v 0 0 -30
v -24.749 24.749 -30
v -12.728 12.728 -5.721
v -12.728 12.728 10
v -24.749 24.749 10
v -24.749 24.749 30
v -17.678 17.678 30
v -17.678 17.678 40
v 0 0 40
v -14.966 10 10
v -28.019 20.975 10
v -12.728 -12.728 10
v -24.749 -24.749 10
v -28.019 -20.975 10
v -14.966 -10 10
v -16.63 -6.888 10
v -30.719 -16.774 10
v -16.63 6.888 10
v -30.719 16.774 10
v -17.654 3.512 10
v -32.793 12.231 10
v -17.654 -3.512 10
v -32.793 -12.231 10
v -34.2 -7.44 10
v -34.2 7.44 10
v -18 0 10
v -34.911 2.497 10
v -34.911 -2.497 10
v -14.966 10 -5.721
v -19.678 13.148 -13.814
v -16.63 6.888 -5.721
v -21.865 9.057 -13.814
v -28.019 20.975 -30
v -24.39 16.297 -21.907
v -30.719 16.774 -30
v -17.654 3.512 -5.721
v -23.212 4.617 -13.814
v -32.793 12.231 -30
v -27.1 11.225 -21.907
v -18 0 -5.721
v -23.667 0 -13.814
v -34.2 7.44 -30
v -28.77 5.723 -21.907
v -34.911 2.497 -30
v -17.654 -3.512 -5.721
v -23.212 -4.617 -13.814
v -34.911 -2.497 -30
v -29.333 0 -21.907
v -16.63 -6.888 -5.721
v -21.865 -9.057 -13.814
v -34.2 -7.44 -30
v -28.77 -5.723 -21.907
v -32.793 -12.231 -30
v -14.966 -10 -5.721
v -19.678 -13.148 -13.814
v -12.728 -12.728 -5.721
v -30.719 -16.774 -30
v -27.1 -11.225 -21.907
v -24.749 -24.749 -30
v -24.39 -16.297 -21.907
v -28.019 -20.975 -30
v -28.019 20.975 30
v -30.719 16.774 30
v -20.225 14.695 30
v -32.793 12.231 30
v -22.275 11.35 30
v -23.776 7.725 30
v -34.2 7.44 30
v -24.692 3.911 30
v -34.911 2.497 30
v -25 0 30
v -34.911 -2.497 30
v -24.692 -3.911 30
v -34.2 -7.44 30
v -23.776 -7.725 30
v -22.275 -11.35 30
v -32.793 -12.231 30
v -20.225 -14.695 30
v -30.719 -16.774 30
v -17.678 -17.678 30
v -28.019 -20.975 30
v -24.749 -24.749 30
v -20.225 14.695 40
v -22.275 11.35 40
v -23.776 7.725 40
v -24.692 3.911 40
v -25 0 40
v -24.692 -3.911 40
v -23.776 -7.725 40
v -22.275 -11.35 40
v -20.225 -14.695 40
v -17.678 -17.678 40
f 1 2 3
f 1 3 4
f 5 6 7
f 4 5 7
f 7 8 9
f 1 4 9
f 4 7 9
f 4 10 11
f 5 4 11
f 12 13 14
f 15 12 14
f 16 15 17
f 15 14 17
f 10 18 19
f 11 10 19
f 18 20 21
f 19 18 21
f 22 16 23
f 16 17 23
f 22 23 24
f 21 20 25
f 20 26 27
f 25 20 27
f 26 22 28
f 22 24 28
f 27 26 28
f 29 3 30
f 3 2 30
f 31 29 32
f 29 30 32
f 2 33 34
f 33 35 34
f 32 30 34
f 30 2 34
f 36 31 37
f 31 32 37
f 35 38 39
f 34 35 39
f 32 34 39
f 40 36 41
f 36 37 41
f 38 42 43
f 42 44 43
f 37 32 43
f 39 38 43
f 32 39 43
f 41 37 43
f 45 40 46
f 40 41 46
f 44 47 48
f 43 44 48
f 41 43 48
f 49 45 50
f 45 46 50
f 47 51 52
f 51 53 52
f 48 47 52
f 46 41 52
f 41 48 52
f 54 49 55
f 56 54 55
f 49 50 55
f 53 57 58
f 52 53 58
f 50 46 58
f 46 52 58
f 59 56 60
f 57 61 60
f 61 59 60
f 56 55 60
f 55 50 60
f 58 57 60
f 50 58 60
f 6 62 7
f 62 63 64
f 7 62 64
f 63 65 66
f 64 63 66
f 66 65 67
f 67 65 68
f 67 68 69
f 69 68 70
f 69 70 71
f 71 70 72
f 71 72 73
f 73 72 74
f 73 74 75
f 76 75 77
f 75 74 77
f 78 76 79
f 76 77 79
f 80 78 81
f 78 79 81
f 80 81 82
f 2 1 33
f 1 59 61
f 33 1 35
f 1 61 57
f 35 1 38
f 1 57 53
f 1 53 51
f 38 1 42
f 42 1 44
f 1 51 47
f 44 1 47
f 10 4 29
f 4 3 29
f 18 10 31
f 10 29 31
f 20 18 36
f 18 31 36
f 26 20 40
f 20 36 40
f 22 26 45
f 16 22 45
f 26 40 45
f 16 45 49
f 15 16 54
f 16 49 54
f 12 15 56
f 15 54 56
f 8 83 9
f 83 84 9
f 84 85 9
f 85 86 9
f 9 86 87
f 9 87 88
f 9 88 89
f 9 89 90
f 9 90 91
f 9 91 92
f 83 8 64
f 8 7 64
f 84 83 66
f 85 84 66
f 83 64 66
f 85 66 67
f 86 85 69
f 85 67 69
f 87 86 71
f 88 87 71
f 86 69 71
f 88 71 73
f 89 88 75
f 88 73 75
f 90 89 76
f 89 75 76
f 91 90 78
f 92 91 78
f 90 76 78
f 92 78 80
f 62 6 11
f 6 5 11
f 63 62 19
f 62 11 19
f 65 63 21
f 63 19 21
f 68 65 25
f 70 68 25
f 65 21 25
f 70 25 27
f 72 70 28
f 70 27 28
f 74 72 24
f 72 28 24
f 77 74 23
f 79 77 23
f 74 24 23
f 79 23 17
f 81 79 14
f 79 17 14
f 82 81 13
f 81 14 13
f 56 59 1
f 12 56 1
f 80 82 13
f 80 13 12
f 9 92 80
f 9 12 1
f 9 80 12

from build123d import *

# Parameters (mm, degrees)
F1_ANGLE_BACK = 45
F1_ANGLE      = 90


# Not quite as in the source:
# - a feature of the source that left no trace in its solid (it failed there, or was rolled back) is left out


with BuildPart() as f1:
    # F0 (on Front) → F1 (revolve)
    with BuildSketch(Plane.XZ, mode=Mode.PRIVATE) as f1_sk:
        Polygon((0, 40), (-25, 40), (-25, 30), (-35, 30), (-35, 10), (-18, 10), (-18, -5.7214838854), (-35, -30), (0, -30), align=None)
    revolve(f1_sk.sketch.rotate(Axis((0, 0, 5), (0, 0, 1)), -F1_ANGLE_BACK), axis=Axis((0, 0, 5), (0, 0, 1)), revolution_arc=F1_ANGLE)


solid = f1.part
